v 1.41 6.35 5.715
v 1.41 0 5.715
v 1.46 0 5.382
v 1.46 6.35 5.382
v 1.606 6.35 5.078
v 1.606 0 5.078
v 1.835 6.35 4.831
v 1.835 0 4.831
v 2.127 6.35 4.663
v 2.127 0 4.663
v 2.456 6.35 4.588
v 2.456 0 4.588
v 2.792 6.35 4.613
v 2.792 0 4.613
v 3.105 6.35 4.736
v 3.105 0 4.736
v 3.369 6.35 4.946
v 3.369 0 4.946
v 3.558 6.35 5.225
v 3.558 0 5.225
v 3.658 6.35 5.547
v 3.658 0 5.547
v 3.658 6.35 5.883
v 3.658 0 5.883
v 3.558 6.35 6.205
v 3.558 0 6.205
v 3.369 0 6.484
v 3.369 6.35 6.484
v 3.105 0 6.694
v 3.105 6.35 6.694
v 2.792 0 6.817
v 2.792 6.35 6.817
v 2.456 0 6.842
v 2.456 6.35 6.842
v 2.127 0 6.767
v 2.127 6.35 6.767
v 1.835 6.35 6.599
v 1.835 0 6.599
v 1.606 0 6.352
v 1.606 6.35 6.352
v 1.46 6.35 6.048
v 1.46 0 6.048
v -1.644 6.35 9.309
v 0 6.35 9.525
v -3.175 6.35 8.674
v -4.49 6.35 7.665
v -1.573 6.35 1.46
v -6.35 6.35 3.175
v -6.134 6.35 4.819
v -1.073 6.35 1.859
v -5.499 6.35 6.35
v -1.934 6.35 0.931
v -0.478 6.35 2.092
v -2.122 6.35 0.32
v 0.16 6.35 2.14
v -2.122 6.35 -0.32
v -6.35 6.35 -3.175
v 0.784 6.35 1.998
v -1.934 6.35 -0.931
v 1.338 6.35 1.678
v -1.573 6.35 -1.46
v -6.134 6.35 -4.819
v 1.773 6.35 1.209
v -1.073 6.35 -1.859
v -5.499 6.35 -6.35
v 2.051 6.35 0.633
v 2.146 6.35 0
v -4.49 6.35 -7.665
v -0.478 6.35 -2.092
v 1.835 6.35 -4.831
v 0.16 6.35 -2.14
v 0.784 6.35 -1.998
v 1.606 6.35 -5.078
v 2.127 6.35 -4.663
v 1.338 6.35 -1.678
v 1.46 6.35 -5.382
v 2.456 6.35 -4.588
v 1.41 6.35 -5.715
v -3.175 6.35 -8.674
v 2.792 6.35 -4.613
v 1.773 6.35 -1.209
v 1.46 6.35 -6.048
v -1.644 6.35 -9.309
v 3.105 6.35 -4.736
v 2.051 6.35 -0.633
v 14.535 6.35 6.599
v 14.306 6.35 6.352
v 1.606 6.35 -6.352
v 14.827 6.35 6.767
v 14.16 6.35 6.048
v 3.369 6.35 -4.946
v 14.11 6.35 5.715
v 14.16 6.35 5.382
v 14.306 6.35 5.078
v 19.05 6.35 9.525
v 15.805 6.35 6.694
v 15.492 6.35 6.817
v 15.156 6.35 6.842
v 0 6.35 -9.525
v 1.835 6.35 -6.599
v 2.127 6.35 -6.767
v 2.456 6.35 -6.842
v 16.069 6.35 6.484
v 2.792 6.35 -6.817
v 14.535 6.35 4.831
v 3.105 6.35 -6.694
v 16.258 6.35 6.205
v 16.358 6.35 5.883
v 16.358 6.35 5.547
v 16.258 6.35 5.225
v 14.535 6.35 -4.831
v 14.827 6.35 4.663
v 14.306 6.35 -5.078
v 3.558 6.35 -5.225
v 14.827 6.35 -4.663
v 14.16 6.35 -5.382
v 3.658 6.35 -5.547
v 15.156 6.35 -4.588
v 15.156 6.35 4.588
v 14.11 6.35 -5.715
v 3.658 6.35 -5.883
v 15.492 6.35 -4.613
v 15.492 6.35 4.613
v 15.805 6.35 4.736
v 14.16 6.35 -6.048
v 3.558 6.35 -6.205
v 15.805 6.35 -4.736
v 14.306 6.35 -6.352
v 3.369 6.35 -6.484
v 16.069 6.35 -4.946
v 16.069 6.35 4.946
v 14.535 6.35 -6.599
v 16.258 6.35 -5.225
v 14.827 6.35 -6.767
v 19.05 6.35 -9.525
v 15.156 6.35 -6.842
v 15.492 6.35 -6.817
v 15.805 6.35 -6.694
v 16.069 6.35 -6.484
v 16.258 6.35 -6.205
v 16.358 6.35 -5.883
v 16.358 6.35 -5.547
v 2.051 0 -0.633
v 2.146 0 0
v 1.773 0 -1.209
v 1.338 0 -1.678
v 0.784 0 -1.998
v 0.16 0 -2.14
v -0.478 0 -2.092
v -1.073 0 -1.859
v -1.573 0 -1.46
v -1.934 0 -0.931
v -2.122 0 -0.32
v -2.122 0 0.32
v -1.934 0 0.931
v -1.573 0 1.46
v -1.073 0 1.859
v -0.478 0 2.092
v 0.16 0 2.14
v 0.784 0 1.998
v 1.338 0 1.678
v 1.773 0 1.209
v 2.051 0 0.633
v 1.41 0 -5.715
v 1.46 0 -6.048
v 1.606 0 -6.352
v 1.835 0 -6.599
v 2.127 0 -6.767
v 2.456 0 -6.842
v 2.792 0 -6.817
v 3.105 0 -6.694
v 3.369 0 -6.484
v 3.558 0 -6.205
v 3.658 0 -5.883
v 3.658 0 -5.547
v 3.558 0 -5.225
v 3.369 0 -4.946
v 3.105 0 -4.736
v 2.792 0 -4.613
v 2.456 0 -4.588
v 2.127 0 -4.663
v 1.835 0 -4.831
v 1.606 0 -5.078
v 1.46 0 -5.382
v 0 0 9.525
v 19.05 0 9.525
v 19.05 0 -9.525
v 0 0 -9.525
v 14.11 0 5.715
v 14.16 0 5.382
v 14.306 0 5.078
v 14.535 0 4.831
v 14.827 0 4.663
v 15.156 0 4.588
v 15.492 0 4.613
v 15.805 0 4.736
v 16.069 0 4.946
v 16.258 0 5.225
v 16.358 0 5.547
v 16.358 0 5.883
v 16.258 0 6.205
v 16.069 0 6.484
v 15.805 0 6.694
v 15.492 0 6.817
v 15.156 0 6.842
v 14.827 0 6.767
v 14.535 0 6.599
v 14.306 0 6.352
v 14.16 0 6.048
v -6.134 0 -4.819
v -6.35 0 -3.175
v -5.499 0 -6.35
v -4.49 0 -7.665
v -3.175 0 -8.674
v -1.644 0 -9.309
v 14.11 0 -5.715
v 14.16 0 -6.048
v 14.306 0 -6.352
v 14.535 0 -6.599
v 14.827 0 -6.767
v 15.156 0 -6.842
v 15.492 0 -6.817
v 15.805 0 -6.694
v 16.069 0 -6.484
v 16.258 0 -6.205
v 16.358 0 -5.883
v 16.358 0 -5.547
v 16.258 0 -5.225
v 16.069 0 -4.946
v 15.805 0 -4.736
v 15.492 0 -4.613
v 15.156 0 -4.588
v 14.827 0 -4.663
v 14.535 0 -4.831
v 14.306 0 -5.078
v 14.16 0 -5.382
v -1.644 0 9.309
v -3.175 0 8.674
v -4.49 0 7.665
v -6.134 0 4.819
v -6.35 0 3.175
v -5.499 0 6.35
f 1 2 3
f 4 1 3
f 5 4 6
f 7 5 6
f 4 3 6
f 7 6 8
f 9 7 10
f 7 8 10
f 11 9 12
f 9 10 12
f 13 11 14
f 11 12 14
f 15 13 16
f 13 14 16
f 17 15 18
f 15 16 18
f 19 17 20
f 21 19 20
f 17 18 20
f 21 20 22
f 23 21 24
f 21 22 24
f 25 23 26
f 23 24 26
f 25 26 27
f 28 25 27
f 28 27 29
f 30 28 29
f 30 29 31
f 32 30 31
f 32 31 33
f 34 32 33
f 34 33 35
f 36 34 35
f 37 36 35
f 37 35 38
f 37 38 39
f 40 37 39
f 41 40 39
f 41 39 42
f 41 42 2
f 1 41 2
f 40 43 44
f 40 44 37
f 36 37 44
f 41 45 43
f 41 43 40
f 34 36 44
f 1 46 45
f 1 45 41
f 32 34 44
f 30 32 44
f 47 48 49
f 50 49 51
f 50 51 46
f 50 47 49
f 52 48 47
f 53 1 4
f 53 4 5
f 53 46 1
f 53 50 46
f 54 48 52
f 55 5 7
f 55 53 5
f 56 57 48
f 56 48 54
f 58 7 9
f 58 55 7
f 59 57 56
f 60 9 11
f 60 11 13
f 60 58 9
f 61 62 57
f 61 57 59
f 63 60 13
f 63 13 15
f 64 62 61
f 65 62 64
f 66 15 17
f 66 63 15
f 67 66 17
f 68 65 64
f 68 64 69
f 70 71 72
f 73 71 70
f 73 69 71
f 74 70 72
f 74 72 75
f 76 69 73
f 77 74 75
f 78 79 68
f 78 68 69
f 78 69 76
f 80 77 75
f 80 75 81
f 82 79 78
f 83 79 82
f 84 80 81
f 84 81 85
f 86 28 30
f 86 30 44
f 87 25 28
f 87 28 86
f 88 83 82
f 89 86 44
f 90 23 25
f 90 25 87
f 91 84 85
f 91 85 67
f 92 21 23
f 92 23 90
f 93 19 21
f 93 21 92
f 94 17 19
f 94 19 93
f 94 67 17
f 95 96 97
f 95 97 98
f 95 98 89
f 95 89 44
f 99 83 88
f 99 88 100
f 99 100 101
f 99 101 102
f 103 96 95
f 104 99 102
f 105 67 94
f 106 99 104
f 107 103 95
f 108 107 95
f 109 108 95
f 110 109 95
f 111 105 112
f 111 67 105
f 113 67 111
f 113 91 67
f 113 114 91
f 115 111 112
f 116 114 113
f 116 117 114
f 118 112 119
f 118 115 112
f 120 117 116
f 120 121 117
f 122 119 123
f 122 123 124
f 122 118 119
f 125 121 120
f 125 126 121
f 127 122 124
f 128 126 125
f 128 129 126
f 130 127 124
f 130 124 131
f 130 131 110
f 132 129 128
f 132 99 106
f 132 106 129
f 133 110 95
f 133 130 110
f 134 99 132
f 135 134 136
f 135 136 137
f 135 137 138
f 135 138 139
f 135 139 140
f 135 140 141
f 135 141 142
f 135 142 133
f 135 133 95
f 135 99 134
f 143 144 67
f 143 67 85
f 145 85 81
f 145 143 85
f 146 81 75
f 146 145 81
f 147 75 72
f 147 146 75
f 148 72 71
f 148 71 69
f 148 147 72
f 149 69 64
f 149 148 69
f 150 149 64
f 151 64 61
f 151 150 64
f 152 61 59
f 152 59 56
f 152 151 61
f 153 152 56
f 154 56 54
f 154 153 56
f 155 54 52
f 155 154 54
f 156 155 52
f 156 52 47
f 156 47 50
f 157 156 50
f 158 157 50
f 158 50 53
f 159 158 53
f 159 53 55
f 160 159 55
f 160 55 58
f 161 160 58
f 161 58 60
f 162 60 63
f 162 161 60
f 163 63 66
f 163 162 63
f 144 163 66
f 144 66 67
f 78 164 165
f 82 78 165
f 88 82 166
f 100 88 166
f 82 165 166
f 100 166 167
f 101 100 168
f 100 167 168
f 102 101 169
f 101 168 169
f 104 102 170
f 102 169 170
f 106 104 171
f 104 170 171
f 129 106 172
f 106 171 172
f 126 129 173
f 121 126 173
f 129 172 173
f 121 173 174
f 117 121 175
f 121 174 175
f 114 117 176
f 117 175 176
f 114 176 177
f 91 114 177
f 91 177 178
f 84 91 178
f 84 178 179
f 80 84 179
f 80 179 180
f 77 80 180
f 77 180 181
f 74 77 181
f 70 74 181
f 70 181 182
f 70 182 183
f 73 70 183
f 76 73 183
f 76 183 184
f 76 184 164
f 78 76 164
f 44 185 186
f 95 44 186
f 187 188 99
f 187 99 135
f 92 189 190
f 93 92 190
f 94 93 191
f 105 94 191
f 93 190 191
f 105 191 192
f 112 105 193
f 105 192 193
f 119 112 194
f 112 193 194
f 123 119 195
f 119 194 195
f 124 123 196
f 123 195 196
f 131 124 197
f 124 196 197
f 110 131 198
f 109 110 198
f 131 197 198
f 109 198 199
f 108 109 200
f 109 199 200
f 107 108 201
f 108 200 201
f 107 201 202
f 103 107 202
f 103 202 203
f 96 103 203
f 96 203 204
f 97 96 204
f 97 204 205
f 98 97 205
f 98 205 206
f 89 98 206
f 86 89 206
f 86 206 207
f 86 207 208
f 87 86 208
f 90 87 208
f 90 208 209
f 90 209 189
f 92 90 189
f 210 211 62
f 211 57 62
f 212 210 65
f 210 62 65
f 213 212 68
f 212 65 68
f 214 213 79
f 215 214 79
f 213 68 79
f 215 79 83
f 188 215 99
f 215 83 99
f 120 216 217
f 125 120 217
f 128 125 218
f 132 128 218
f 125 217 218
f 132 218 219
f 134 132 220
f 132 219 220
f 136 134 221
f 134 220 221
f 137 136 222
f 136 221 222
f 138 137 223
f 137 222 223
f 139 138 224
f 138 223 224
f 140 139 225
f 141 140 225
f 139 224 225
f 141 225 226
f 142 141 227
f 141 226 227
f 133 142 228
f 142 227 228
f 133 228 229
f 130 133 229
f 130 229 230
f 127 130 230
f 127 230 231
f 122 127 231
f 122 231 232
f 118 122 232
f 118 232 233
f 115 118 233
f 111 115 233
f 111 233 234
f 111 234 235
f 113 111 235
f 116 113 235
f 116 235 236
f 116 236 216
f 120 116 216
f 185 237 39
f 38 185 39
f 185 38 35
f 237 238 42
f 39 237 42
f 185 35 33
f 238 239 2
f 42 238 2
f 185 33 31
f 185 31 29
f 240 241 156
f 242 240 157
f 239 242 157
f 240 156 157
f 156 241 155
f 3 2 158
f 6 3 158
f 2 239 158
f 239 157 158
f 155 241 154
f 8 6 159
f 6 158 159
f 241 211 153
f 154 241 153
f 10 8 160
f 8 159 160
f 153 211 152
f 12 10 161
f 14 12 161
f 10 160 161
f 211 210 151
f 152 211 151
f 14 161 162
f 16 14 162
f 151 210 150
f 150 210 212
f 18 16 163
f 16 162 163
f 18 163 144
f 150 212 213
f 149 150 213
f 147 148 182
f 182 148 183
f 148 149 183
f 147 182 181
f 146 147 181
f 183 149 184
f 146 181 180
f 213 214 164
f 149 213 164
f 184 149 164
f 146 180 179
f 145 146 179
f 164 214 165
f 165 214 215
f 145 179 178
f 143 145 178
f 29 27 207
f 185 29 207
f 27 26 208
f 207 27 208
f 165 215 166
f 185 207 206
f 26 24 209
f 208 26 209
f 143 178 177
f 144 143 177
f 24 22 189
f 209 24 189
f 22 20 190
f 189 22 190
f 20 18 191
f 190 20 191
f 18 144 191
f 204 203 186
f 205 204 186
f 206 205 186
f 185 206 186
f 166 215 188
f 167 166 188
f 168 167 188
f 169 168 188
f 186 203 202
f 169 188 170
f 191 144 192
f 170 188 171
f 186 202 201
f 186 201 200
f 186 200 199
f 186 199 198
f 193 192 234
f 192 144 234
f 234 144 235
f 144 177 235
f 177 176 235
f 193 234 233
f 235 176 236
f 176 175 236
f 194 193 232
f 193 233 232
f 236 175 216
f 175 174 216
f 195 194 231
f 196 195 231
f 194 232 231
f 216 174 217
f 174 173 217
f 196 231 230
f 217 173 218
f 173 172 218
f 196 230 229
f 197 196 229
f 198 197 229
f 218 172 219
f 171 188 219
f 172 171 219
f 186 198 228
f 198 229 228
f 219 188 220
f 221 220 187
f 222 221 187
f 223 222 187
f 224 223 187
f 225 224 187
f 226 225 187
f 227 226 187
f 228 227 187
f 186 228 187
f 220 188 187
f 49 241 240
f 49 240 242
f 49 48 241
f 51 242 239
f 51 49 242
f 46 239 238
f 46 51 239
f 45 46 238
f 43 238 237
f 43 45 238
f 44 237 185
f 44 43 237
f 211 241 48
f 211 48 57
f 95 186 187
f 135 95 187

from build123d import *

# Parameters (mm, degrees)
SKETCH1_W                 = 25.4
SKETCH1_H                 = 19.05
SKETCH1_R                 = 2.1463
BOSS_EXTRUDE1_DEPTH       = 6.35
F_4_40_TAPPED_HOLE1_D     = 2.2606
F_4_40_TAPPED_HOLE1_DEPTH = 7.5946
F_4_40_TAPPED_HOLE1_TIP   = 0.679152758
FILLET1_R                 = 6.35


with BuildPart() as part:
    # Sketch1 → Boss-Extrude1 (new body)
    with BuildSketch(Plane(origin=(0, 0, 0), x_dir=(1, 0, 0), z_dir=(0, 1, 0))):
        with Locations((6.35, 0)):
            Rectangle(SKETCH1_W, SKETCH1_H)
        Circle(SKETCH1_R, mode=Mode.SUBTRACT)
    extrude(amount=BOSS_EXTRUDE1_DEPTH)

    # #4-40 Tapped Hole1
    with Locations(Plane(origin=(0, 6.35, 0), x_dir=(1, 0, 0), z_dir=(0, 1, 0))):
        with Locations((2.54, 5.715), (15.24, -5.715), (2.54, -5.715), (15.24, 5.715)):
            Hole(F_4_40_TAPPED_HOLE1_D / 2, depth=F_4_40_TAPPED_HOLE1_DEPTH)
            with Locations((0, 0, -(F_4_40_TAPPED_HOLE1_DEPTH + F_4_40_TAPPED_HOLE1_TIP / 2))):  # 118° drill point
                Cone(0, F_4_40_TAPPED_HOLE1_D / 2, F_4_40_TAPPED_HOLE1_TIP, mode=Mode.SUBTRACT)

    # Fillet1
    fillet1_edges = [part.edges().sort_by_distance(p)[0] for p in [
        (-6.35, 3.175, -9.525),
        (-6.35, 3.175, 9.525),
    ]]
    fillet(fillet1_edges, radius=FILLET1_R)


solid = part.part
